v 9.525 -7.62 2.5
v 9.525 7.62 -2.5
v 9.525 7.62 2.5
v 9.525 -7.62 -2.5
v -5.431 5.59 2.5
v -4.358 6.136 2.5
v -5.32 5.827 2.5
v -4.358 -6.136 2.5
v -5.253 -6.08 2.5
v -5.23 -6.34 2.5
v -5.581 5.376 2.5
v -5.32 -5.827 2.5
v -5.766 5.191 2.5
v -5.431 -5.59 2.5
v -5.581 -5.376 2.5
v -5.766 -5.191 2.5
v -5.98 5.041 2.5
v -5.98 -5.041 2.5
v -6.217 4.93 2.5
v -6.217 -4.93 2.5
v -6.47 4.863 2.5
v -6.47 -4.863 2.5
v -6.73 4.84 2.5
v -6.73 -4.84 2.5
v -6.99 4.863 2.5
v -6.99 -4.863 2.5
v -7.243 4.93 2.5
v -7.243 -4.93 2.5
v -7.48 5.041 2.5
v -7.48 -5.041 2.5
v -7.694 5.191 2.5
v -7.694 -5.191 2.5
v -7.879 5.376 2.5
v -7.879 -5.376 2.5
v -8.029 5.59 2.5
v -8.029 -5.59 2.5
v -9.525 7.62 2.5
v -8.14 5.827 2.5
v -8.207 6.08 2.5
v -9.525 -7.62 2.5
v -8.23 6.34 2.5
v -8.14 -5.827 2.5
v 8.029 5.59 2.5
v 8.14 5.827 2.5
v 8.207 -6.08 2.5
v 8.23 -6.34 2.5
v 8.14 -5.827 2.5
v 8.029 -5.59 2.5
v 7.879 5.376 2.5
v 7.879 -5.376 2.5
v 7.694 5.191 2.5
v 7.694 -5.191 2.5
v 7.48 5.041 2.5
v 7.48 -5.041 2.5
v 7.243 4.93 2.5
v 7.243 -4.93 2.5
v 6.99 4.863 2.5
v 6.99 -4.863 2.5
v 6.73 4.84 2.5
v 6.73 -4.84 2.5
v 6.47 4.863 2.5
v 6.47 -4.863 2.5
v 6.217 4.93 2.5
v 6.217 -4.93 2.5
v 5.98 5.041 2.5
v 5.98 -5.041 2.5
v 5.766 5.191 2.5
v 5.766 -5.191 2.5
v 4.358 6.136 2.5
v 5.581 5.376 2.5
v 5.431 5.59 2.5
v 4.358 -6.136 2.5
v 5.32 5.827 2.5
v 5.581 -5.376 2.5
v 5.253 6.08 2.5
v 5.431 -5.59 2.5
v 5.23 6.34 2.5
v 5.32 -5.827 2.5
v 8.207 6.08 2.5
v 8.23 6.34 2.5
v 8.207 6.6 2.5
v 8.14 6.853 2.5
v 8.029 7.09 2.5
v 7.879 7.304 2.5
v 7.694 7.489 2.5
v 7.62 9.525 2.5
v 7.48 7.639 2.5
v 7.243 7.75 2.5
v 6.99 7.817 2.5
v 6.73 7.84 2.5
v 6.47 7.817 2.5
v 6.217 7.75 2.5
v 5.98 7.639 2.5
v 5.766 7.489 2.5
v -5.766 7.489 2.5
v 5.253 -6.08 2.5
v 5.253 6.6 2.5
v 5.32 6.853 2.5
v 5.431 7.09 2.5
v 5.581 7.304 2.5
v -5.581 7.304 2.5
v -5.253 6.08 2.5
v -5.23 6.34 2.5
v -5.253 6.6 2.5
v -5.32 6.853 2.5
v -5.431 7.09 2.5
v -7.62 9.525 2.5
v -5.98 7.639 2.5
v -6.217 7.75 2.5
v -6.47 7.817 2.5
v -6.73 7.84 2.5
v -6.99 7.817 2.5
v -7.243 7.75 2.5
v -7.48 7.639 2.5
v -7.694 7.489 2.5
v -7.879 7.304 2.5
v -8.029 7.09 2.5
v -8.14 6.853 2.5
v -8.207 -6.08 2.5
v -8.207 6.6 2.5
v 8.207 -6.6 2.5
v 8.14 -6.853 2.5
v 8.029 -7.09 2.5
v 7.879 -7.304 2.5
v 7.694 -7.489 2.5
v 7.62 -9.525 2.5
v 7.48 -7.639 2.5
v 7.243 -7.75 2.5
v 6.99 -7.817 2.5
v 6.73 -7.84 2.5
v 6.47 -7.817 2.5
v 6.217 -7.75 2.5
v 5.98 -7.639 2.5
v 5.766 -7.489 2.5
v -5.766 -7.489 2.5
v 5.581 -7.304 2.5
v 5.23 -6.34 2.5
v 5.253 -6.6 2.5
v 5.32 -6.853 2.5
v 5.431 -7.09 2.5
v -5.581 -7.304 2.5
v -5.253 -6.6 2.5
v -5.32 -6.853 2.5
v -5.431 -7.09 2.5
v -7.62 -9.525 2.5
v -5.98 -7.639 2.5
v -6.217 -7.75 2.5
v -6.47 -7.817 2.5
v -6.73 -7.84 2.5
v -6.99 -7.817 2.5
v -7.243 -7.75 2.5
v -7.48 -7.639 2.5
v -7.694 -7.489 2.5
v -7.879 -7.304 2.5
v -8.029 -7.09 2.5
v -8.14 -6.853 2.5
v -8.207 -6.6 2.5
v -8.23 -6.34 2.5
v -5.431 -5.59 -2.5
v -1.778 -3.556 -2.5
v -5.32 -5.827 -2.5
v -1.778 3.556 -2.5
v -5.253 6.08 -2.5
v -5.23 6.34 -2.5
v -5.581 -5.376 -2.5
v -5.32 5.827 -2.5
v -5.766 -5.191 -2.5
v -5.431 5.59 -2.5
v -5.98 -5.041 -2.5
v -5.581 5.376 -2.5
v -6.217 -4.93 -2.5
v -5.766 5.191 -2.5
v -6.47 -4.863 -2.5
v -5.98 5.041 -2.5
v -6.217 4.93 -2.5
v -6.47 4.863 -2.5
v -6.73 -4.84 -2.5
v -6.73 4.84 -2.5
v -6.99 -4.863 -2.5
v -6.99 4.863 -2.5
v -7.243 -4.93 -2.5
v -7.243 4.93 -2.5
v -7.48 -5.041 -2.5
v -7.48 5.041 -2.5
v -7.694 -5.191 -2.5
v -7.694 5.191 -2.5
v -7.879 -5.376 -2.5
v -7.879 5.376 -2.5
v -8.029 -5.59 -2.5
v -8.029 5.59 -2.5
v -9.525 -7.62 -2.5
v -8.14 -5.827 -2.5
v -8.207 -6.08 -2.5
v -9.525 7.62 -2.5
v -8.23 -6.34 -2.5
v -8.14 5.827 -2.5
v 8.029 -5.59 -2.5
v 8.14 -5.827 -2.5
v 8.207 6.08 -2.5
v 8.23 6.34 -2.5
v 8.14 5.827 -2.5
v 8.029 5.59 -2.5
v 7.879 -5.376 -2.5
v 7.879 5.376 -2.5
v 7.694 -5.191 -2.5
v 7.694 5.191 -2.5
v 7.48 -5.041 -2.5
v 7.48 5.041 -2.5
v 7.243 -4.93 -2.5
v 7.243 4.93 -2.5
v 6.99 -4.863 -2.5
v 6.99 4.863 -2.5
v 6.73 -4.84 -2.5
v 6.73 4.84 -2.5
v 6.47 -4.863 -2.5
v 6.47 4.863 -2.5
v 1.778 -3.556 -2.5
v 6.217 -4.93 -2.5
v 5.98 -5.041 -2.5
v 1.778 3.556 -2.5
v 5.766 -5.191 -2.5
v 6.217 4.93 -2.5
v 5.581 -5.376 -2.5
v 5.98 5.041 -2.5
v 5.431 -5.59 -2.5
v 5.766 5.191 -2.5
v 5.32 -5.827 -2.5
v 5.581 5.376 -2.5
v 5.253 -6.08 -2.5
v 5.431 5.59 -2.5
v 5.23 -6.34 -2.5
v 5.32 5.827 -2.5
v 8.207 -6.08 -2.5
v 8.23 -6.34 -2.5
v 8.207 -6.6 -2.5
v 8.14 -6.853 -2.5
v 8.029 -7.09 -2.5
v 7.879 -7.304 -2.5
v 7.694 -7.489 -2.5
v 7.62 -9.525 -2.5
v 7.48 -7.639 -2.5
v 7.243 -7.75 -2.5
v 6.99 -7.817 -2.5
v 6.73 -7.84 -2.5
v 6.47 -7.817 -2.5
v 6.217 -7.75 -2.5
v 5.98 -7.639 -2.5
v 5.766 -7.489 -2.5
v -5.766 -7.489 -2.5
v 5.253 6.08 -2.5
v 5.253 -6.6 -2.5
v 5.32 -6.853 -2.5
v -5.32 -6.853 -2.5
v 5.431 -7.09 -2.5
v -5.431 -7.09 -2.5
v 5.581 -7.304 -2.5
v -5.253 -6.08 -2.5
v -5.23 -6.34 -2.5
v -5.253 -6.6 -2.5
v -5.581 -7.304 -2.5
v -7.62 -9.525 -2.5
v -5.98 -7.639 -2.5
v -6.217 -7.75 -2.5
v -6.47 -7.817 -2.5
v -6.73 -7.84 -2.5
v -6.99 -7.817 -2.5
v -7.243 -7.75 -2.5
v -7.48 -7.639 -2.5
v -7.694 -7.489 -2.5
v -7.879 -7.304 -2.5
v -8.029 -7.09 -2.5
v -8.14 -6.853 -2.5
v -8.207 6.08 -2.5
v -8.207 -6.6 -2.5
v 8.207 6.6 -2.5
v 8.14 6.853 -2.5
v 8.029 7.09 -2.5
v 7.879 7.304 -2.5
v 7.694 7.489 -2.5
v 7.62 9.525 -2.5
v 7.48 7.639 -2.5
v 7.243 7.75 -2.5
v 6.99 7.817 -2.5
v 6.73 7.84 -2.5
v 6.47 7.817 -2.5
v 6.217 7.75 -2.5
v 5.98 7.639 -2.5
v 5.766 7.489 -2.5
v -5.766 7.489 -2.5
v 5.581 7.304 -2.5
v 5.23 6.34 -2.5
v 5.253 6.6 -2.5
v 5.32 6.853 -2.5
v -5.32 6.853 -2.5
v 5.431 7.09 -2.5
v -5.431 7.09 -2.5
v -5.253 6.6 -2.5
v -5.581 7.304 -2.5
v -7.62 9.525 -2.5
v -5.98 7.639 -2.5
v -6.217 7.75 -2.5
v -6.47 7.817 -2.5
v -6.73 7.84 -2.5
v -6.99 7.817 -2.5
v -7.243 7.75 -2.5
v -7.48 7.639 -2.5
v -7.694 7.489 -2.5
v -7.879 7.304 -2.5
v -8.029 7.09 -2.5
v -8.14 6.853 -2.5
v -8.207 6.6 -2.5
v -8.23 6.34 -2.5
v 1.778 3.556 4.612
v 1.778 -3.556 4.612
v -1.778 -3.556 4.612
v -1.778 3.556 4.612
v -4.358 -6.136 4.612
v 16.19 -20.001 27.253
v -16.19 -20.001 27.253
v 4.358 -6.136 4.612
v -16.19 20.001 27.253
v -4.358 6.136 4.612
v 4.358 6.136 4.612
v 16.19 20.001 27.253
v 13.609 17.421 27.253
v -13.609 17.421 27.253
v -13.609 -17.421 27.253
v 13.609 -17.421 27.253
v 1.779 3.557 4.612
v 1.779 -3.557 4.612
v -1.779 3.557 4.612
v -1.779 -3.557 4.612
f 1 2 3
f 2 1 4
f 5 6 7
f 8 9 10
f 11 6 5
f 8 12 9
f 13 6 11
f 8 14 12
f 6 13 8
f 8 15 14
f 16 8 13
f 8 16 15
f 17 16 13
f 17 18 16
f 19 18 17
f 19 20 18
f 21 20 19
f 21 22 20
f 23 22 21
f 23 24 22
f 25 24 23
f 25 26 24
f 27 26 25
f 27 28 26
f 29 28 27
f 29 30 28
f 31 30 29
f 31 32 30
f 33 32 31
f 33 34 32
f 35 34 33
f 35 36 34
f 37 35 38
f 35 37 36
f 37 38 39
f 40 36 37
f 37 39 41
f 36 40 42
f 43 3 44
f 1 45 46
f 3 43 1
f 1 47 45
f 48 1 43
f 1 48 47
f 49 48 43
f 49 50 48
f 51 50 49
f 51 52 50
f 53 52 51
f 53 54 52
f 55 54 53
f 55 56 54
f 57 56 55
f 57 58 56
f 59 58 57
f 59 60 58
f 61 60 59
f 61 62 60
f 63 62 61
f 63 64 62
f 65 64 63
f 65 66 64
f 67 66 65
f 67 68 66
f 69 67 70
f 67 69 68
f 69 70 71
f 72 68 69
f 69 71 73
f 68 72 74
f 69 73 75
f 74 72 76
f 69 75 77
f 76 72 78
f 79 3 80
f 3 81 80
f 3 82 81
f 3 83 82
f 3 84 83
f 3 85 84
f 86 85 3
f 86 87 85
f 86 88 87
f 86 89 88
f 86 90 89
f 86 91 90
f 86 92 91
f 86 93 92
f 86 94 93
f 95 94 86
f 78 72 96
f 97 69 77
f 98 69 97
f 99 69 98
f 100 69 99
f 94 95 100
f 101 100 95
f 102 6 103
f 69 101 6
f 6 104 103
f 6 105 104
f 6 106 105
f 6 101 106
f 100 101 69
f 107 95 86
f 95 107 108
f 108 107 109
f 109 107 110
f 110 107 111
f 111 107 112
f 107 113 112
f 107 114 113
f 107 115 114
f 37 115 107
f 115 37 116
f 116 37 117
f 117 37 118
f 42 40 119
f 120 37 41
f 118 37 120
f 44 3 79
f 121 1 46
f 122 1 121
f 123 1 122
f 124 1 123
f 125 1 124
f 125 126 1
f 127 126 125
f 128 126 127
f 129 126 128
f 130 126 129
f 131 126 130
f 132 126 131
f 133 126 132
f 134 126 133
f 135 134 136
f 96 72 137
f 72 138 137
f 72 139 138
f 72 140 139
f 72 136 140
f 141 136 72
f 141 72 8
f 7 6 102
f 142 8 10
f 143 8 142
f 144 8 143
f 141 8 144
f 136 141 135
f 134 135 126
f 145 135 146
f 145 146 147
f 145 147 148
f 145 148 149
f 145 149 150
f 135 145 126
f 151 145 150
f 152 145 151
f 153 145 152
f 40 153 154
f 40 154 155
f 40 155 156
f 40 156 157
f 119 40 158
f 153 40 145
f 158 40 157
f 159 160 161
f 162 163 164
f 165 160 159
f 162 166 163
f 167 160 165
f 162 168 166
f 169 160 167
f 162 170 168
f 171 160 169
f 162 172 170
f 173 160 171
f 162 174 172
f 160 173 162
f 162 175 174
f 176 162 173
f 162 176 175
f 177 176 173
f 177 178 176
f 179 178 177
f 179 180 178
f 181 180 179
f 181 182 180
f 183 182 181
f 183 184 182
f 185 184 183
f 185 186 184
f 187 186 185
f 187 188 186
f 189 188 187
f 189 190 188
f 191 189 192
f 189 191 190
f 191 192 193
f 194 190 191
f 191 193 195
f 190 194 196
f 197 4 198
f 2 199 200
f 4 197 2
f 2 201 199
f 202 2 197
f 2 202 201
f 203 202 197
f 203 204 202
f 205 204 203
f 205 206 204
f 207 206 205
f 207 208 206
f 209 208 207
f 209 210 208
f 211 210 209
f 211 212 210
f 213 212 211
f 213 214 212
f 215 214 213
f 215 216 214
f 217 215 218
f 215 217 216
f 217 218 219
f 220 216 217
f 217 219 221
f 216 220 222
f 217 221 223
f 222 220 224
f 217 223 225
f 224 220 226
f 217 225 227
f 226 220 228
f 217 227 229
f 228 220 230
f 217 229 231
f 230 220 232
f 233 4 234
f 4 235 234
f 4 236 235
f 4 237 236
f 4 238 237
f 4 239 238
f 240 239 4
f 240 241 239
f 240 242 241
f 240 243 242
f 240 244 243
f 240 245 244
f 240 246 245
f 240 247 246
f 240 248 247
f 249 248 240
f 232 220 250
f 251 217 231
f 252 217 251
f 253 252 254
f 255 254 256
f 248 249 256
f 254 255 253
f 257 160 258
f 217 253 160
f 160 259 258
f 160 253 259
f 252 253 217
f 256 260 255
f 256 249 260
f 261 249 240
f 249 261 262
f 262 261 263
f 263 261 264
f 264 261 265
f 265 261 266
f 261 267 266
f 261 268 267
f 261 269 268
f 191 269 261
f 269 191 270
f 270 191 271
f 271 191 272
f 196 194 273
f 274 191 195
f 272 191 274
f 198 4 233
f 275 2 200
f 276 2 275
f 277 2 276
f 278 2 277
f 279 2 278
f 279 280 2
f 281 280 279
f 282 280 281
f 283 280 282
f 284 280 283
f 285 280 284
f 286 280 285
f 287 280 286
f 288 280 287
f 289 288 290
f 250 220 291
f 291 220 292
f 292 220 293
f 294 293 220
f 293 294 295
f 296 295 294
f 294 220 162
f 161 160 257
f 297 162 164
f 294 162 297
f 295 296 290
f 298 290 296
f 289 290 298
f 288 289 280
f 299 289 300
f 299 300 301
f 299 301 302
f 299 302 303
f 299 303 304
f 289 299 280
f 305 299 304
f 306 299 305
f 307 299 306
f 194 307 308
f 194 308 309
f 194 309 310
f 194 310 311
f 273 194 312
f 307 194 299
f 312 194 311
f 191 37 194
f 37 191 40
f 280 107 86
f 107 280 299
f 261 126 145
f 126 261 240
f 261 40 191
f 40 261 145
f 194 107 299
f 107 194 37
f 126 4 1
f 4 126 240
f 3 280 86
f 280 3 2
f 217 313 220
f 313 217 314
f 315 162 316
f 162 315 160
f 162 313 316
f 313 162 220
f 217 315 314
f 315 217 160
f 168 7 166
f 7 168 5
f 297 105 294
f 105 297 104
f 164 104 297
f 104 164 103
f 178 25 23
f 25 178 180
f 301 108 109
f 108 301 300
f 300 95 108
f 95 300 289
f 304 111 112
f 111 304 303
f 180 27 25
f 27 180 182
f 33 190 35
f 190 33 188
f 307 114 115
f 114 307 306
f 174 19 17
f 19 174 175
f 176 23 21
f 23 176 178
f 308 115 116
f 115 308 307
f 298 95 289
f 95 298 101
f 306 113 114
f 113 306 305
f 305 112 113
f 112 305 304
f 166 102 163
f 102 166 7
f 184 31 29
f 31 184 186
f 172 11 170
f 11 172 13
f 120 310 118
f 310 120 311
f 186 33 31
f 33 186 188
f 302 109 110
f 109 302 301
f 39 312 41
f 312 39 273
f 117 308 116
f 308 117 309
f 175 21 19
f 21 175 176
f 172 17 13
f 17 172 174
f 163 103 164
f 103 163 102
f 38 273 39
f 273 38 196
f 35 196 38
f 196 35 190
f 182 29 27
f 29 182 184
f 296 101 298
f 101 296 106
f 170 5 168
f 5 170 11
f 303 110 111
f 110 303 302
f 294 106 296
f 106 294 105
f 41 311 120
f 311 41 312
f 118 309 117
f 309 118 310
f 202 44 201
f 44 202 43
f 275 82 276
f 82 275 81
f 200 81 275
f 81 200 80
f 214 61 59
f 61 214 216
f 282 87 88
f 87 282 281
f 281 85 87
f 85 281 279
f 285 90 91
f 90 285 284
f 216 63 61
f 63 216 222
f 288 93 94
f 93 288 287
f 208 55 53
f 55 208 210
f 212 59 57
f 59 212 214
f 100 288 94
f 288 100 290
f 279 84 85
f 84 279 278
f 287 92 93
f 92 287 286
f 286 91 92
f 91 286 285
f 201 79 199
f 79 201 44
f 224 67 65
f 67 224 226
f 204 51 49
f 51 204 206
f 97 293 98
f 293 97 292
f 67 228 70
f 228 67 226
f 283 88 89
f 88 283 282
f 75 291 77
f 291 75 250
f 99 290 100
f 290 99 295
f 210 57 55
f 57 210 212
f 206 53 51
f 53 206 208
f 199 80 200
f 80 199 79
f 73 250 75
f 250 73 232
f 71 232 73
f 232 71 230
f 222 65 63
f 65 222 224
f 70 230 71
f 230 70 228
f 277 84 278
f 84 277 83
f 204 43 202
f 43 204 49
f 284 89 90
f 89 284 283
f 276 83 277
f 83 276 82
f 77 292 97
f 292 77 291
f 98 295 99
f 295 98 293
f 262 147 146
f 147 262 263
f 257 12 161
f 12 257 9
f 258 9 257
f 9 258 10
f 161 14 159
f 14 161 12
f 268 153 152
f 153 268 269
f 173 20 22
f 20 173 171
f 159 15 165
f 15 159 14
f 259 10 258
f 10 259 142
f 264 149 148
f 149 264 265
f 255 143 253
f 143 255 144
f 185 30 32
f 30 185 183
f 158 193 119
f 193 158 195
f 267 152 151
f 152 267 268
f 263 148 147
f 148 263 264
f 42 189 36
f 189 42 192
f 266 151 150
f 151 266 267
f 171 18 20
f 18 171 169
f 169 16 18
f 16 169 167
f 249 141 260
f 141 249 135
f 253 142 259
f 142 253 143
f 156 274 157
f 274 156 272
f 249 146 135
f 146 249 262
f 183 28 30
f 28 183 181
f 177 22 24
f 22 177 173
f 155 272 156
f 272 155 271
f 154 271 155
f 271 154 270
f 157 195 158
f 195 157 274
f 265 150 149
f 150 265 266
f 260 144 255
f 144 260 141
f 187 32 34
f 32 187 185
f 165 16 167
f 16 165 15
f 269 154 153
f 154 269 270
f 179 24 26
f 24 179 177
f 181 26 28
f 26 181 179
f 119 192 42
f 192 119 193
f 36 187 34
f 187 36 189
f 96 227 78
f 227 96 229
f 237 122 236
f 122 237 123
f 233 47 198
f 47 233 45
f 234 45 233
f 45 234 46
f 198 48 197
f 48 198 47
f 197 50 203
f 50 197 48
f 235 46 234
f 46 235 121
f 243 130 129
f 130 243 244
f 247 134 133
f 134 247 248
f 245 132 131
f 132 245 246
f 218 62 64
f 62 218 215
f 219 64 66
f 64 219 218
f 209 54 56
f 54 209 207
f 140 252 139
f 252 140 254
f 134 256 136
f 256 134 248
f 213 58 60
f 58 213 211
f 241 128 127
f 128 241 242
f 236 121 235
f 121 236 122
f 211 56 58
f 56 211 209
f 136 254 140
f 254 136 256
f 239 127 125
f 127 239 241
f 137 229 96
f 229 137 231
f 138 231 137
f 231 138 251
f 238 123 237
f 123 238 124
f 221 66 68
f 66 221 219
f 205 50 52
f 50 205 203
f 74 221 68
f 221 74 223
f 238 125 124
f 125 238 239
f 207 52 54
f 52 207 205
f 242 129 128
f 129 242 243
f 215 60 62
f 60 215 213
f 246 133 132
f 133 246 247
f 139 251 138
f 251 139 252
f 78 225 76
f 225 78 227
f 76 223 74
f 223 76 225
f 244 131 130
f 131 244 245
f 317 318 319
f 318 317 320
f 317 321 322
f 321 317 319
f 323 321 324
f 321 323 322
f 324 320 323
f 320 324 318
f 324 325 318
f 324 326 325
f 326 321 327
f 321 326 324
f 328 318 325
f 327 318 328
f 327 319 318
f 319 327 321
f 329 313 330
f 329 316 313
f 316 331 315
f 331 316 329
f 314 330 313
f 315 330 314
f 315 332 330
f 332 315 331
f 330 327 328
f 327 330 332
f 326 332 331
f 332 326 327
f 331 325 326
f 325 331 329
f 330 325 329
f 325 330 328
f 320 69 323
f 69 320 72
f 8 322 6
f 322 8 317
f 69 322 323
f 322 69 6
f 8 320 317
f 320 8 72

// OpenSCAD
// [FL_INDEX: keywords="openscad, 3d_parametric, Waveguide_Hornantenna_Customziable, csg_solid" | COT="Parametric OpenSCAD design from 3DCodeverse"]
// Title: Waveguide Hornantenna Customziable


// *************************************************************
// (C) 2013 Dipl.Ing. Rolf-Dieter Klein, Munich Germany
// OpenSource -- would be great to keep my name as reference
// HORN ANTENNA for Microwaves -- use copper to metallize
// or use for metal casting !!
// www.rdklein.de
// report error, problems to rdklein@rdklein.de
// *************************************************************
// WR Flange Code 
wrcode = 8; // [1:WR112,2:WR90,3:WR75,4:WR62,5:WR51,6:WR42,7:WR34,8:WR28]
//
// overall wall thickness in mm
wall = 2.58; // 
// flange thickness
flanged = 5; // flange thickness
//
// Antennalenght multiplier R0 = Lambda * n
multin = 2; // default 2Lambda

// addon in lamba/2 units flanged is subtracted ! !
waveadd = 1;  

// standard dimension tables
// WR cannot be entered directly due to openscad variable restrictions
// a case of if for assignment cannot be used, index is easier for this.
// WR 112 7.05-10.00 GHz
// WR 90  8.20-12.40 GHz
// WR 75  10.00-15.00 GHz
// WR 62  12.49-18.00 GHz
// WR 51  15.00-22.00 GHz
// WR 42  18.00-26.50 GHz
// WR 34  22.00-33.00 GHz
// WR 28  26.50-40.00 GHz
//
// do not change:
wrtab = [0,112,90,75,62,51,42,34,28]*1.0;
// do not change:
atab = [0,47.9,41.4,38.3,33.3,31.0,22.41,22.1,19.05]*1.0;
// do not change:
etab = [0,18.72,16.26,14.25,12.14,11.25,8.51,7.9,6.73]*1.0;
// do not change:
ftab = [0,17.17,15.49,13.21,12.63,10.29,8.13,7.5,6.34]*1.0;
// do not change:
drilltab=[0,4.3,4.3,4.1,4.1,4.1,3.1,3.1,3.0]*1.0;
// dann werte zuweisen
// ueber index
sizea = atab[wrcode]; // square size of flange
sizee = etab[wrcode]; // holes from smaller 
sizef = ftab[wrcode]; // holes from larger 
drill = drilltab[wrcode]/2.0; // drill for flange mounting
wr = wrtab[wrcode];
lquat = wr/20.0*2.54; // lamba 4 in mm
//

// faces for precision
$fn=36; // faces for precision
//
// *********** FLANGE ****************
// Draw A Flange with mounting holes
// now with separate thickness.
difference() {
 difference() {
 	intersection() {

		cube([sizea,sizea,flanged],center=true);
		rotate([0,0,45]) cube([sizea*1.4142*0.9,sizea*1.4142*0.9,flanged],center=true);
	}
	cube([lquat,lquat*2,wall*2],center=true);
 } 
 translate([-sizee,sizef,0]) cylinder(h=flanged*2,r=drill,center=true);
 translate([sizee,sizef,0]) cylinder(h=flanged*2,r=drill,center=true);
 translate([-sizee,-sizef,0]) cylinder(h=flanged*2,r=drill,center=true);
 translate([sizee,-sizef,0]) cylinder(h=flanged*2,r=drill,center=true);
}
//
// ***** HORN ANTENNA *****
// Pyramidal Horn
// r0 = length to pyramidal joint point
//
r0 = multin * lquat * 4; // lambda * 4 * multiplier for r0
Asize = sqrt(3*lquat*4*r0); // Size in H plane direction
//
// *** if preferred Bsize = sqrt(2*lquat*4*r0); // Size in E plane direction
//
a = lquat*2; // simpler for calc below
b = lquat;
// ********* rh and re now the base... one can be choosen
// optimal horn is for re=rh
// 
Bsize = 1/2*(b + sqrt(b*b+(8*Asize*(Asize-a)/3) ));
//
echo(r0);
echo(Asize);
//
lh = sqrt(r0*r0+(Asize*Asize)/4);
rh = Asize*( (Asize- a)/(3*lquat*4));

// rh = (Asize- a)*sqrt((lh/Asize)-1/4);
// le = sqrt(r0*r0+(Bsize*Bsize)/4);
// re = (Bsize- b)*sqrt((le/Bsize)-1/4);
// 
 
rh1 = rh * 1.00001; // for boolean problems to be solved
offset1 = -0.001+0.0;

// 
wa1= wall;
// wall thickness not alongside, but if needed:
// alpha = atan(Asize/(2*r0));
// wa1 = wall/cos(alpha);
// echo("alpha",alpha,"walpha=",wa1);
//
// Outer Polygon
 difference() {
translate([0,0,-flanged/2+lquat*2*waveadd]) polyhedron(
  points=[ [Bsize/2+wa1,Asize/2+wa1,rh],[Bsize/2+wa1,-Asize/2-wa1,rh],[-Bsize/2-wa1,-Asize/2-wa1,rh],[-Bsize/2-wa1,Asize/2+wa1,rh], /// the four points at base
           [b/2+wa1,wa1+a/2,0],[b/2+wa1,-wa1-a/2,0],[-wa1-b/2,-wa1-a/2,0],[-wa1-b/2,wa1+a/2,0]  ],                                 // the apex point 
  triangles=[ [0,1,4],[1,2,5],[2,3,6],[3,0,7],          // each triangle side
				   [1,5,4],[2,6,5],[3,7,6],[0,4,7],
              [1,0,3],[2,1,3],[4,5,7],[5,6,7]  ]                         // two triangles for square base
 );
// b in x a in y
// inner polygon for subtration...

translate([0,0,-flanged/2+lquat*2*waveadd]) polyhedron(
  points=[ [Bsize/2,Asize/2,rh1],[Bsize/2,-Asize/2,rh1],[-Bsize/2,-Asize/2,rh1],[-Bsize/2,Asize/2,rh1], /// the four points at base
           [b/2,a/2,offset1],[b/2,-a/2,offset1],[-b/2,-a/2,offset1],[-b/2,a/2,offset1]  ],                                 // the apex point 
  triangles=[ [0,1,4],[1,2,5],[2,3,6],[3,0,7],          // each triangle side
				   [1,5,4],[2,6,5],[3,7,6],[0,4,7],
              [1,0,3],[2,1,3],[4,5,7],[5,6,7]  ]                         // two triangles for square
);
}
// Additional wavequide 
difference() {
 translate([0,0,-flanged/2+lquat*waveadd]) cube([lquat+wall*2,lquat*2+wall*2,lquat*2*waveadd],center=true);
 translate([0,0,-flanged/2+lquat*waveadd]) cube([lquat,lquat*2,lquat*2*waveadd+wall*3],center=true);
}
//


 
